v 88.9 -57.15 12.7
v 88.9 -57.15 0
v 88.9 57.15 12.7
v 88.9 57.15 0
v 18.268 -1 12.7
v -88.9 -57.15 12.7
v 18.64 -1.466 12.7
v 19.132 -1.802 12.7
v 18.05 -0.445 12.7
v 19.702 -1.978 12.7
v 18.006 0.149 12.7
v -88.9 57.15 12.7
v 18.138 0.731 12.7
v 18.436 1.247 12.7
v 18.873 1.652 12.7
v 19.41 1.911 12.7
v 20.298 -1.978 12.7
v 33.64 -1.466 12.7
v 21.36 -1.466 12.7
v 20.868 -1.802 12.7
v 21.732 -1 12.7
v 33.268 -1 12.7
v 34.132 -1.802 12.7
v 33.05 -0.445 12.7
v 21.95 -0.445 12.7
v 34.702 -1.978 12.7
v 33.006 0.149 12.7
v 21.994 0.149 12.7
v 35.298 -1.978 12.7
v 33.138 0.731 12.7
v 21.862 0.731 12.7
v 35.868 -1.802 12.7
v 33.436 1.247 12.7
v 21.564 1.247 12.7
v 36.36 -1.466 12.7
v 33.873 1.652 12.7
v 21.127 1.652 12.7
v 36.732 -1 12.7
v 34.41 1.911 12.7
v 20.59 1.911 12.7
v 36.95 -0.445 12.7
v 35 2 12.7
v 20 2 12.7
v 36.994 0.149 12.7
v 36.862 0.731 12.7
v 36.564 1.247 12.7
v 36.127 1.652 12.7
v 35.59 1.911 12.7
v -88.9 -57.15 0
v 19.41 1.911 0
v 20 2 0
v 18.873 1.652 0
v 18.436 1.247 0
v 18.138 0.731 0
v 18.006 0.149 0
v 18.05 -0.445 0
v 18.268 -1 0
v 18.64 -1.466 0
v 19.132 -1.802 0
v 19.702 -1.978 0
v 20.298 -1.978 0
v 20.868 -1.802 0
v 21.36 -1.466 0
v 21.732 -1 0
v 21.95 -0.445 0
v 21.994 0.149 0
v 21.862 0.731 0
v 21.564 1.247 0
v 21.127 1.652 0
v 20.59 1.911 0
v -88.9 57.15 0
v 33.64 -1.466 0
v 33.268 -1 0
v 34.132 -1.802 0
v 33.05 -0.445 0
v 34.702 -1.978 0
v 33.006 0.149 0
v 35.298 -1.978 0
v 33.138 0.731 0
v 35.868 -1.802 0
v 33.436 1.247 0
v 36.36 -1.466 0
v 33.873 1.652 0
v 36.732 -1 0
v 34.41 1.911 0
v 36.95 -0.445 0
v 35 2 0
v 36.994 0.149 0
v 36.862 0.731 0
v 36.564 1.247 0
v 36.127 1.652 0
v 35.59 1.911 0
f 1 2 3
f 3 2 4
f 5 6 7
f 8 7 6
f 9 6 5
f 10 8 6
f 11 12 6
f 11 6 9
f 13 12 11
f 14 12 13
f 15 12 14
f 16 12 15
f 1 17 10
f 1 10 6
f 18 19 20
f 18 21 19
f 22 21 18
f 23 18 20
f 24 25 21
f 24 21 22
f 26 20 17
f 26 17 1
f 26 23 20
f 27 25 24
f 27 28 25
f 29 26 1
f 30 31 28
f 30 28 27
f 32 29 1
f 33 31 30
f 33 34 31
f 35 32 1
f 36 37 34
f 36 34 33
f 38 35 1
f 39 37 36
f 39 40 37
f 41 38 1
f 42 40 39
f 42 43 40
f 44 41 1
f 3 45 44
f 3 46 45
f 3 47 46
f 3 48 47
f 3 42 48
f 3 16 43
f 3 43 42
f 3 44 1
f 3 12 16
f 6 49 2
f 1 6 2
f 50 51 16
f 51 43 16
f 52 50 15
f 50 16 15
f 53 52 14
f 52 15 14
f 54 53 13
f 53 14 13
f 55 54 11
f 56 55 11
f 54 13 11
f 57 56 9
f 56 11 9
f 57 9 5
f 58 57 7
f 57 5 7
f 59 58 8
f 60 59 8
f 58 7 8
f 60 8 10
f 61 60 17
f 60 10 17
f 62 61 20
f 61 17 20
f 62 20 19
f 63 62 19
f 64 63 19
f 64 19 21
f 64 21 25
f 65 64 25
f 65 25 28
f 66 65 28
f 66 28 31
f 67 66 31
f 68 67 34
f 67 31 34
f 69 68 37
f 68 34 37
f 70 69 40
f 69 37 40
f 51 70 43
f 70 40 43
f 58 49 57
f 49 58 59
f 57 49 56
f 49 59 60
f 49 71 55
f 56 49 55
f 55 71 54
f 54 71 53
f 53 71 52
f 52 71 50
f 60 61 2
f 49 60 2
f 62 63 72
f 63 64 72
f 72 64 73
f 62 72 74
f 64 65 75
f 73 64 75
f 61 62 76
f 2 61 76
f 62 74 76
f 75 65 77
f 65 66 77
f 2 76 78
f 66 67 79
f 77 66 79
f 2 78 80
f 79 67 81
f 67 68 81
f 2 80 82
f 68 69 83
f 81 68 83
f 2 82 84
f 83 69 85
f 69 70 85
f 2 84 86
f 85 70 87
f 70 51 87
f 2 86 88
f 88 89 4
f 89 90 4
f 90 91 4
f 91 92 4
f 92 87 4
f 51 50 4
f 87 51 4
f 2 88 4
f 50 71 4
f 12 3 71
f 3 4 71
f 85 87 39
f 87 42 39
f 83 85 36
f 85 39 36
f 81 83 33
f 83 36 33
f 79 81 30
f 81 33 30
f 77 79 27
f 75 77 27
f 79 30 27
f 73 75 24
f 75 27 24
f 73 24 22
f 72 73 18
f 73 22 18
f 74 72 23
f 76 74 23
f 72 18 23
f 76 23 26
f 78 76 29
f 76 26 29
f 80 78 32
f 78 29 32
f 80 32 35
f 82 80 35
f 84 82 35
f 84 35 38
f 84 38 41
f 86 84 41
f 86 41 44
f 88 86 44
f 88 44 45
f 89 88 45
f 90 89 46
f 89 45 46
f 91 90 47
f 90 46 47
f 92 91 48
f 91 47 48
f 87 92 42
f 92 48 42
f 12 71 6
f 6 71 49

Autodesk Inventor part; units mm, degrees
ref_plane "YZ Plane" through (0, 0, 0) normal (1, 0, 0) x (0, 1, 0)
ref_plane "XZ Plane" through (0, 0, 0) normal (0, 1, 0) x (-1, 0, 0)
ref_plane "XY Plane" through (0, 0, 0) normal (0, 0, 1) x (1, 0, 0)
sketch "Sketch1" plane through (0, 0, 0) normal (0, 0, 1) x (1, 0, 0)
  line L0 (-88.9, -57.15) -> (88.9, -57.15)
  line L1 (88.9, -57.15) -> (88.9, 57.15)
  line L2 (88.9, 57.15) -> (-88.9, 57.15)
  line L3 (-88.9, 57.15) -> (-88.9, -57.15)
  line L4 (-88.9, -57.15) -> (88.9, 57.15) construction
  line L5 (88.9, -57.15) -> (-88.9, 57.15) construction
  line L6 (-40, 6.35) -> (40, 6.35)
  line L7 (40, 6.35) -> (40, -6.35)
  line L8 (40, -6.35) -> (-40, -6.35)
  line L9 (-40, -6.35) -> (-40, 6.35)
  line L10 (-40, 6.35) -> (40, -6.35) construction
  line L11 (40, 6.35) -> (-40, -6.35) construction
  point P0 (0, 0)
  point P1 (35, 0)
  point P2 (20, 0)
  dimension "d0" = 177.8
  dimension "d1" = 114.3
  dimension "d2" = 80
  dimension "d3" = 12.7
extrude "Extrusion2" add sketch "Sketch1" along normal blind 12.7 contours L3 L2 L1 L0 | L6 L7 L8 L9
hole "Hole1" at (35, 0, 0) at (20, 0, 0) direction (0, 0, 1) diameter 4 end through all
properties part number "LoadCellUpperSide"
